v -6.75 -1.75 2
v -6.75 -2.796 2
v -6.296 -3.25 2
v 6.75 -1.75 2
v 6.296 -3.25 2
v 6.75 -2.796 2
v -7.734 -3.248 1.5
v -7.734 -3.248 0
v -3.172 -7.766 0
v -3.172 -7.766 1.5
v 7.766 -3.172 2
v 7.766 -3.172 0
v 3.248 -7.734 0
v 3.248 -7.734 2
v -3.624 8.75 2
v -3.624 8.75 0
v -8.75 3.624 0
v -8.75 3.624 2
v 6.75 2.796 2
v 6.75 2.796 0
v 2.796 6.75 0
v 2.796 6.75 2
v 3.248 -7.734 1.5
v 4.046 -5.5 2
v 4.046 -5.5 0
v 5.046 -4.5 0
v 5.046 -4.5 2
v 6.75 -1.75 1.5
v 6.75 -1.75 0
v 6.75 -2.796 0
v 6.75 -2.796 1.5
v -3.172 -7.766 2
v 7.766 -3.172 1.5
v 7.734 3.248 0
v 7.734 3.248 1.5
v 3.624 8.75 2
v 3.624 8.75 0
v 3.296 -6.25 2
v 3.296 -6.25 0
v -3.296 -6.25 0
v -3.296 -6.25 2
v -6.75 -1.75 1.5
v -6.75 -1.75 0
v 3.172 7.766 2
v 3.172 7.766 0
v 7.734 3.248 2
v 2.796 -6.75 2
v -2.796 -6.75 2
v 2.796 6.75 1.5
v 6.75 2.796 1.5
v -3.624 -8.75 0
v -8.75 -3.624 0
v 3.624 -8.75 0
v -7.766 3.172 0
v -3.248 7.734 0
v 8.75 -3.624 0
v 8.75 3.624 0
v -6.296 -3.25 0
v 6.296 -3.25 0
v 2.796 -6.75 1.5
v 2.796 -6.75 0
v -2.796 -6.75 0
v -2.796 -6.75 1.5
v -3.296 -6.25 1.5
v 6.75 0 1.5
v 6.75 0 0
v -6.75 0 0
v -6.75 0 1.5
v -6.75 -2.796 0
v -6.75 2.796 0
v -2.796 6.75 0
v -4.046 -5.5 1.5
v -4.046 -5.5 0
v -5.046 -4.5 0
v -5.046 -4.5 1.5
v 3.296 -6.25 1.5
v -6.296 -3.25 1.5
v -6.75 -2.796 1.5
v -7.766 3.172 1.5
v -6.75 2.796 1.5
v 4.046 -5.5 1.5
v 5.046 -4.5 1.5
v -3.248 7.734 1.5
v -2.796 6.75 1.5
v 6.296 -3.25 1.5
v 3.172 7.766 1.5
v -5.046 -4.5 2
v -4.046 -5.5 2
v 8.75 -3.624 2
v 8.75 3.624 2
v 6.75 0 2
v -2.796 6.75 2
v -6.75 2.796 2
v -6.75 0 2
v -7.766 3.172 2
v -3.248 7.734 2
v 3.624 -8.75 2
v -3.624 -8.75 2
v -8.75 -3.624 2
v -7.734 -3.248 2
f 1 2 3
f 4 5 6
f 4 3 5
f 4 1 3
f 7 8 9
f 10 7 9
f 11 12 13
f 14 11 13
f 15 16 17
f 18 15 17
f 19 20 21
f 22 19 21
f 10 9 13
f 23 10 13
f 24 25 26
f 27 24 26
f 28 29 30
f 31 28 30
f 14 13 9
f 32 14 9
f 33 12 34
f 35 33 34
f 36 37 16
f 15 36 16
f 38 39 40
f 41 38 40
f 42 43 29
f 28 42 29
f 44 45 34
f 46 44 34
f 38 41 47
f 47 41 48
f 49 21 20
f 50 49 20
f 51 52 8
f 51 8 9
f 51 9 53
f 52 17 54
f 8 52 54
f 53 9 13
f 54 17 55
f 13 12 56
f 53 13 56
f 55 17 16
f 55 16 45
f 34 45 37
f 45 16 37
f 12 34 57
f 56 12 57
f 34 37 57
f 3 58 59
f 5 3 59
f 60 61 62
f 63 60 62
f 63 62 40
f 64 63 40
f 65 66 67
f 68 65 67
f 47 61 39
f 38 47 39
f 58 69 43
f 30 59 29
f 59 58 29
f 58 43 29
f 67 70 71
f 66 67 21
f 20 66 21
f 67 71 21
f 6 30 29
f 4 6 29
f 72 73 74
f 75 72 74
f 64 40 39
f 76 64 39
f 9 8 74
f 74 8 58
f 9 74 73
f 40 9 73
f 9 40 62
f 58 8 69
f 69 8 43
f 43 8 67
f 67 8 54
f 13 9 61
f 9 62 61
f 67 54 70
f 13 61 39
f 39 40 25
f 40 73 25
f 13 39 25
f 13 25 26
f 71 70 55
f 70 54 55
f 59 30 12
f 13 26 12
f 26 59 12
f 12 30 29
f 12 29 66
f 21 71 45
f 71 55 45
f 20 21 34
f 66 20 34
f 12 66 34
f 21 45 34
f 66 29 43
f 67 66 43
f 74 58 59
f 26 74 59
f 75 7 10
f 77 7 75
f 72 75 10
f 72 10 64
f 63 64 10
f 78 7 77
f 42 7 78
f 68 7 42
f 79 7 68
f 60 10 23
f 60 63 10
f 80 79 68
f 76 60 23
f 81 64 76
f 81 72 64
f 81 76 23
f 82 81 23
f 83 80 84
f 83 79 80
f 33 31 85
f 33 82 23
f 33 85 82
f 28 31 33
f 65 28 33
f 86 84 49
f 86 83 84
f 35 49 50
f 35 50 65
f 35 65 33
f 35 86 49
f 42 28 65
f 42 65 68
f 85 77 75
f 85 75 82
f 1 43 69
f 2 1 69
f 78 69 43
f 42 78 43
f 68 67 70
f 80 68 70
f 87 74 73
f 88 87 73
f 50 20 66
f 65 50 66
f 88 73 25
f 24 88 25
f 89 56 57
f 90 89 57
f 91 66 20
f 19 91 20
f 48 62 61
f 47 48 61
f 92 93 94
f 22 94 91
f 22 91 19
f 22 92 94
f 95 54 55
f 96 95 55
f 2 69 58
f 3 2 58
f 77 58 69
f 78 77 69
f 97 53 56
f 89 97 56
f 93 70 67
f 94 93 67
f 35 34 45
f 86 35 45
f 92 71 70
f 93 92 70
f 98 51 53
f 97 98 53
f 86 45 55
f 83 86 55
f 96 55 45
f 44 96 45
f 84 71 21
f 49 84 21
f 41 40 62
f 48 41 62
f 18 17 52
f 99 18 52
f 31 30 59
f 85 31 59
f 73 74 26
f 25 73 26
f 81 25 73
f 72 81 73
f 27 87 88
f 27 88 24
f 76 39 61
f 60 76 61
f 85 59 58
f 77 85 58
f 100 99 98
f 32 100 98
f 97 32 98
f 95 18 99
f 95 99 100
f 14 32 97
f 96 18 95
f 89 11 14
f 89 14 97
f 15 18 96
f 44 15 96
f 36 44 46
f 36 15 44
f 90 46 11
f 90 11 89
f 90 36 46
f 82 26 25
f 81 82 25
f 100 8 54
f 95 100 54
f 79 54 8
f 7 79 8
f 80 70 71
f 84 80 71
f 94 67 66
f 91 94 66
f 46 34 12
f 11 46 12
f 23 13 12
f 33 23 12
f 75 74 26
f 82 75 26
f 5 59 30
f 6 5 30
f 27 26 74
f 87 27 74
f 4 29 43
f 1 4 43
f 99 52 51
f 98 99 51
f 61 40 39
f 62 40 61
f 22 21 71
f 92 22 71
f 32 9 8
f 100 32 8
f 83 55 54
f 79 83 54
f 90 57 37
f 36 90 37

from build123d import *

# Parameters (mm, degrees)
F1_DEPTH = 2
F2_DEPTH = 1.5


with BuildPart() as f1:
    # F0 (on Top) → F1 (new body)
    with BuildSketch(Plane.XY):
        Polygon((3.624369, -8.75), (8.75, -3.624369), (8.75, 3.624369), (3.624369, 8.75), (-3.624369, 8.75), (-8.75, 3.624369), (-8.75, -3.624369), (-3.624369, -8.75), align=None)
        Polygon((7.734257, 3.247901), (7.765558, -3.172333), (3.247901, -7.734257), (-3.172333, -7.765558), (-7.734257, -3.247901), (-7.765558, 3.172333), (-3.247901, 7.734257), (3.172333, 7.765558), align=None, mode=Mode.SUBTRACT)
        Polygon((-2.795942, 6.75), (-6.75, 2.795942), (-6.75, 0), (6.75, 0), (6.75, 2.795942), (2.795942, 6.75), align=None)
        Polygon((6.295942, -3.25), (6.75, -2.795942), (6.75, -1.75), (-6.75, -1.75), (-6.75, -2.795942), (-6.295942, -3.25), align=None)
        Polygon((5.045942, -4.5), (-5.045942, -4.5), (-4.045942, -5.5), (4.045942, -5.5), align=None)
        Polygon((-2.795942, -6.75), (2.795942, -6.75), (3.295942, -6.25), (-3.295942, -6.25), align=None)
    extrude(amount=F1_DEPTH)


with BuildPart() as f2:
    # F0 (on Top) → F2 (new body)
    with BuildSketch(Plane.XY):
        Polygon((3.247901, -7.734257), (7.765558, -3.172333), (7.734257, 3.247901), (3.172333, 7.765558), (-3.247901, 7.734257), (-7.765558, 3.172333), (-7.734257, -3.247901), (-3.172333, -7.765558), align=None)
        Polygon((3.295942, -6.25), (2.795942, -6.75), (-2.795942, -6.75), (-3.295942, -6.25), align=None, mode=Mode.SUBTRACT)
        Polygon((-4.045942, -5.5), (-5.045942, -4.5), (5.045942, -4.5), (4.045942, -5.5), align=None, mode=Mode.SUBTRACT)
        Polygon((6.75, -1.75), (6.75, -2.795942), (6.295942, -3.25), (-6.295942, -3.25), (-6.75, -2.795942), (-6.75, -1.75), align=None, mode=Mode.SUBTRACT)
        Polygon((-6.75, 0), (-6.75, 2.795942), (-2.795942, 6.75), (2.795942, 6.75), (6.75, 2.795942), (6.75, 0), align=None, mode=Mode.SUBTRACT)
    extrude(amount=F2_DEPTH)


solid = Compound([f1.part, f2.part])
